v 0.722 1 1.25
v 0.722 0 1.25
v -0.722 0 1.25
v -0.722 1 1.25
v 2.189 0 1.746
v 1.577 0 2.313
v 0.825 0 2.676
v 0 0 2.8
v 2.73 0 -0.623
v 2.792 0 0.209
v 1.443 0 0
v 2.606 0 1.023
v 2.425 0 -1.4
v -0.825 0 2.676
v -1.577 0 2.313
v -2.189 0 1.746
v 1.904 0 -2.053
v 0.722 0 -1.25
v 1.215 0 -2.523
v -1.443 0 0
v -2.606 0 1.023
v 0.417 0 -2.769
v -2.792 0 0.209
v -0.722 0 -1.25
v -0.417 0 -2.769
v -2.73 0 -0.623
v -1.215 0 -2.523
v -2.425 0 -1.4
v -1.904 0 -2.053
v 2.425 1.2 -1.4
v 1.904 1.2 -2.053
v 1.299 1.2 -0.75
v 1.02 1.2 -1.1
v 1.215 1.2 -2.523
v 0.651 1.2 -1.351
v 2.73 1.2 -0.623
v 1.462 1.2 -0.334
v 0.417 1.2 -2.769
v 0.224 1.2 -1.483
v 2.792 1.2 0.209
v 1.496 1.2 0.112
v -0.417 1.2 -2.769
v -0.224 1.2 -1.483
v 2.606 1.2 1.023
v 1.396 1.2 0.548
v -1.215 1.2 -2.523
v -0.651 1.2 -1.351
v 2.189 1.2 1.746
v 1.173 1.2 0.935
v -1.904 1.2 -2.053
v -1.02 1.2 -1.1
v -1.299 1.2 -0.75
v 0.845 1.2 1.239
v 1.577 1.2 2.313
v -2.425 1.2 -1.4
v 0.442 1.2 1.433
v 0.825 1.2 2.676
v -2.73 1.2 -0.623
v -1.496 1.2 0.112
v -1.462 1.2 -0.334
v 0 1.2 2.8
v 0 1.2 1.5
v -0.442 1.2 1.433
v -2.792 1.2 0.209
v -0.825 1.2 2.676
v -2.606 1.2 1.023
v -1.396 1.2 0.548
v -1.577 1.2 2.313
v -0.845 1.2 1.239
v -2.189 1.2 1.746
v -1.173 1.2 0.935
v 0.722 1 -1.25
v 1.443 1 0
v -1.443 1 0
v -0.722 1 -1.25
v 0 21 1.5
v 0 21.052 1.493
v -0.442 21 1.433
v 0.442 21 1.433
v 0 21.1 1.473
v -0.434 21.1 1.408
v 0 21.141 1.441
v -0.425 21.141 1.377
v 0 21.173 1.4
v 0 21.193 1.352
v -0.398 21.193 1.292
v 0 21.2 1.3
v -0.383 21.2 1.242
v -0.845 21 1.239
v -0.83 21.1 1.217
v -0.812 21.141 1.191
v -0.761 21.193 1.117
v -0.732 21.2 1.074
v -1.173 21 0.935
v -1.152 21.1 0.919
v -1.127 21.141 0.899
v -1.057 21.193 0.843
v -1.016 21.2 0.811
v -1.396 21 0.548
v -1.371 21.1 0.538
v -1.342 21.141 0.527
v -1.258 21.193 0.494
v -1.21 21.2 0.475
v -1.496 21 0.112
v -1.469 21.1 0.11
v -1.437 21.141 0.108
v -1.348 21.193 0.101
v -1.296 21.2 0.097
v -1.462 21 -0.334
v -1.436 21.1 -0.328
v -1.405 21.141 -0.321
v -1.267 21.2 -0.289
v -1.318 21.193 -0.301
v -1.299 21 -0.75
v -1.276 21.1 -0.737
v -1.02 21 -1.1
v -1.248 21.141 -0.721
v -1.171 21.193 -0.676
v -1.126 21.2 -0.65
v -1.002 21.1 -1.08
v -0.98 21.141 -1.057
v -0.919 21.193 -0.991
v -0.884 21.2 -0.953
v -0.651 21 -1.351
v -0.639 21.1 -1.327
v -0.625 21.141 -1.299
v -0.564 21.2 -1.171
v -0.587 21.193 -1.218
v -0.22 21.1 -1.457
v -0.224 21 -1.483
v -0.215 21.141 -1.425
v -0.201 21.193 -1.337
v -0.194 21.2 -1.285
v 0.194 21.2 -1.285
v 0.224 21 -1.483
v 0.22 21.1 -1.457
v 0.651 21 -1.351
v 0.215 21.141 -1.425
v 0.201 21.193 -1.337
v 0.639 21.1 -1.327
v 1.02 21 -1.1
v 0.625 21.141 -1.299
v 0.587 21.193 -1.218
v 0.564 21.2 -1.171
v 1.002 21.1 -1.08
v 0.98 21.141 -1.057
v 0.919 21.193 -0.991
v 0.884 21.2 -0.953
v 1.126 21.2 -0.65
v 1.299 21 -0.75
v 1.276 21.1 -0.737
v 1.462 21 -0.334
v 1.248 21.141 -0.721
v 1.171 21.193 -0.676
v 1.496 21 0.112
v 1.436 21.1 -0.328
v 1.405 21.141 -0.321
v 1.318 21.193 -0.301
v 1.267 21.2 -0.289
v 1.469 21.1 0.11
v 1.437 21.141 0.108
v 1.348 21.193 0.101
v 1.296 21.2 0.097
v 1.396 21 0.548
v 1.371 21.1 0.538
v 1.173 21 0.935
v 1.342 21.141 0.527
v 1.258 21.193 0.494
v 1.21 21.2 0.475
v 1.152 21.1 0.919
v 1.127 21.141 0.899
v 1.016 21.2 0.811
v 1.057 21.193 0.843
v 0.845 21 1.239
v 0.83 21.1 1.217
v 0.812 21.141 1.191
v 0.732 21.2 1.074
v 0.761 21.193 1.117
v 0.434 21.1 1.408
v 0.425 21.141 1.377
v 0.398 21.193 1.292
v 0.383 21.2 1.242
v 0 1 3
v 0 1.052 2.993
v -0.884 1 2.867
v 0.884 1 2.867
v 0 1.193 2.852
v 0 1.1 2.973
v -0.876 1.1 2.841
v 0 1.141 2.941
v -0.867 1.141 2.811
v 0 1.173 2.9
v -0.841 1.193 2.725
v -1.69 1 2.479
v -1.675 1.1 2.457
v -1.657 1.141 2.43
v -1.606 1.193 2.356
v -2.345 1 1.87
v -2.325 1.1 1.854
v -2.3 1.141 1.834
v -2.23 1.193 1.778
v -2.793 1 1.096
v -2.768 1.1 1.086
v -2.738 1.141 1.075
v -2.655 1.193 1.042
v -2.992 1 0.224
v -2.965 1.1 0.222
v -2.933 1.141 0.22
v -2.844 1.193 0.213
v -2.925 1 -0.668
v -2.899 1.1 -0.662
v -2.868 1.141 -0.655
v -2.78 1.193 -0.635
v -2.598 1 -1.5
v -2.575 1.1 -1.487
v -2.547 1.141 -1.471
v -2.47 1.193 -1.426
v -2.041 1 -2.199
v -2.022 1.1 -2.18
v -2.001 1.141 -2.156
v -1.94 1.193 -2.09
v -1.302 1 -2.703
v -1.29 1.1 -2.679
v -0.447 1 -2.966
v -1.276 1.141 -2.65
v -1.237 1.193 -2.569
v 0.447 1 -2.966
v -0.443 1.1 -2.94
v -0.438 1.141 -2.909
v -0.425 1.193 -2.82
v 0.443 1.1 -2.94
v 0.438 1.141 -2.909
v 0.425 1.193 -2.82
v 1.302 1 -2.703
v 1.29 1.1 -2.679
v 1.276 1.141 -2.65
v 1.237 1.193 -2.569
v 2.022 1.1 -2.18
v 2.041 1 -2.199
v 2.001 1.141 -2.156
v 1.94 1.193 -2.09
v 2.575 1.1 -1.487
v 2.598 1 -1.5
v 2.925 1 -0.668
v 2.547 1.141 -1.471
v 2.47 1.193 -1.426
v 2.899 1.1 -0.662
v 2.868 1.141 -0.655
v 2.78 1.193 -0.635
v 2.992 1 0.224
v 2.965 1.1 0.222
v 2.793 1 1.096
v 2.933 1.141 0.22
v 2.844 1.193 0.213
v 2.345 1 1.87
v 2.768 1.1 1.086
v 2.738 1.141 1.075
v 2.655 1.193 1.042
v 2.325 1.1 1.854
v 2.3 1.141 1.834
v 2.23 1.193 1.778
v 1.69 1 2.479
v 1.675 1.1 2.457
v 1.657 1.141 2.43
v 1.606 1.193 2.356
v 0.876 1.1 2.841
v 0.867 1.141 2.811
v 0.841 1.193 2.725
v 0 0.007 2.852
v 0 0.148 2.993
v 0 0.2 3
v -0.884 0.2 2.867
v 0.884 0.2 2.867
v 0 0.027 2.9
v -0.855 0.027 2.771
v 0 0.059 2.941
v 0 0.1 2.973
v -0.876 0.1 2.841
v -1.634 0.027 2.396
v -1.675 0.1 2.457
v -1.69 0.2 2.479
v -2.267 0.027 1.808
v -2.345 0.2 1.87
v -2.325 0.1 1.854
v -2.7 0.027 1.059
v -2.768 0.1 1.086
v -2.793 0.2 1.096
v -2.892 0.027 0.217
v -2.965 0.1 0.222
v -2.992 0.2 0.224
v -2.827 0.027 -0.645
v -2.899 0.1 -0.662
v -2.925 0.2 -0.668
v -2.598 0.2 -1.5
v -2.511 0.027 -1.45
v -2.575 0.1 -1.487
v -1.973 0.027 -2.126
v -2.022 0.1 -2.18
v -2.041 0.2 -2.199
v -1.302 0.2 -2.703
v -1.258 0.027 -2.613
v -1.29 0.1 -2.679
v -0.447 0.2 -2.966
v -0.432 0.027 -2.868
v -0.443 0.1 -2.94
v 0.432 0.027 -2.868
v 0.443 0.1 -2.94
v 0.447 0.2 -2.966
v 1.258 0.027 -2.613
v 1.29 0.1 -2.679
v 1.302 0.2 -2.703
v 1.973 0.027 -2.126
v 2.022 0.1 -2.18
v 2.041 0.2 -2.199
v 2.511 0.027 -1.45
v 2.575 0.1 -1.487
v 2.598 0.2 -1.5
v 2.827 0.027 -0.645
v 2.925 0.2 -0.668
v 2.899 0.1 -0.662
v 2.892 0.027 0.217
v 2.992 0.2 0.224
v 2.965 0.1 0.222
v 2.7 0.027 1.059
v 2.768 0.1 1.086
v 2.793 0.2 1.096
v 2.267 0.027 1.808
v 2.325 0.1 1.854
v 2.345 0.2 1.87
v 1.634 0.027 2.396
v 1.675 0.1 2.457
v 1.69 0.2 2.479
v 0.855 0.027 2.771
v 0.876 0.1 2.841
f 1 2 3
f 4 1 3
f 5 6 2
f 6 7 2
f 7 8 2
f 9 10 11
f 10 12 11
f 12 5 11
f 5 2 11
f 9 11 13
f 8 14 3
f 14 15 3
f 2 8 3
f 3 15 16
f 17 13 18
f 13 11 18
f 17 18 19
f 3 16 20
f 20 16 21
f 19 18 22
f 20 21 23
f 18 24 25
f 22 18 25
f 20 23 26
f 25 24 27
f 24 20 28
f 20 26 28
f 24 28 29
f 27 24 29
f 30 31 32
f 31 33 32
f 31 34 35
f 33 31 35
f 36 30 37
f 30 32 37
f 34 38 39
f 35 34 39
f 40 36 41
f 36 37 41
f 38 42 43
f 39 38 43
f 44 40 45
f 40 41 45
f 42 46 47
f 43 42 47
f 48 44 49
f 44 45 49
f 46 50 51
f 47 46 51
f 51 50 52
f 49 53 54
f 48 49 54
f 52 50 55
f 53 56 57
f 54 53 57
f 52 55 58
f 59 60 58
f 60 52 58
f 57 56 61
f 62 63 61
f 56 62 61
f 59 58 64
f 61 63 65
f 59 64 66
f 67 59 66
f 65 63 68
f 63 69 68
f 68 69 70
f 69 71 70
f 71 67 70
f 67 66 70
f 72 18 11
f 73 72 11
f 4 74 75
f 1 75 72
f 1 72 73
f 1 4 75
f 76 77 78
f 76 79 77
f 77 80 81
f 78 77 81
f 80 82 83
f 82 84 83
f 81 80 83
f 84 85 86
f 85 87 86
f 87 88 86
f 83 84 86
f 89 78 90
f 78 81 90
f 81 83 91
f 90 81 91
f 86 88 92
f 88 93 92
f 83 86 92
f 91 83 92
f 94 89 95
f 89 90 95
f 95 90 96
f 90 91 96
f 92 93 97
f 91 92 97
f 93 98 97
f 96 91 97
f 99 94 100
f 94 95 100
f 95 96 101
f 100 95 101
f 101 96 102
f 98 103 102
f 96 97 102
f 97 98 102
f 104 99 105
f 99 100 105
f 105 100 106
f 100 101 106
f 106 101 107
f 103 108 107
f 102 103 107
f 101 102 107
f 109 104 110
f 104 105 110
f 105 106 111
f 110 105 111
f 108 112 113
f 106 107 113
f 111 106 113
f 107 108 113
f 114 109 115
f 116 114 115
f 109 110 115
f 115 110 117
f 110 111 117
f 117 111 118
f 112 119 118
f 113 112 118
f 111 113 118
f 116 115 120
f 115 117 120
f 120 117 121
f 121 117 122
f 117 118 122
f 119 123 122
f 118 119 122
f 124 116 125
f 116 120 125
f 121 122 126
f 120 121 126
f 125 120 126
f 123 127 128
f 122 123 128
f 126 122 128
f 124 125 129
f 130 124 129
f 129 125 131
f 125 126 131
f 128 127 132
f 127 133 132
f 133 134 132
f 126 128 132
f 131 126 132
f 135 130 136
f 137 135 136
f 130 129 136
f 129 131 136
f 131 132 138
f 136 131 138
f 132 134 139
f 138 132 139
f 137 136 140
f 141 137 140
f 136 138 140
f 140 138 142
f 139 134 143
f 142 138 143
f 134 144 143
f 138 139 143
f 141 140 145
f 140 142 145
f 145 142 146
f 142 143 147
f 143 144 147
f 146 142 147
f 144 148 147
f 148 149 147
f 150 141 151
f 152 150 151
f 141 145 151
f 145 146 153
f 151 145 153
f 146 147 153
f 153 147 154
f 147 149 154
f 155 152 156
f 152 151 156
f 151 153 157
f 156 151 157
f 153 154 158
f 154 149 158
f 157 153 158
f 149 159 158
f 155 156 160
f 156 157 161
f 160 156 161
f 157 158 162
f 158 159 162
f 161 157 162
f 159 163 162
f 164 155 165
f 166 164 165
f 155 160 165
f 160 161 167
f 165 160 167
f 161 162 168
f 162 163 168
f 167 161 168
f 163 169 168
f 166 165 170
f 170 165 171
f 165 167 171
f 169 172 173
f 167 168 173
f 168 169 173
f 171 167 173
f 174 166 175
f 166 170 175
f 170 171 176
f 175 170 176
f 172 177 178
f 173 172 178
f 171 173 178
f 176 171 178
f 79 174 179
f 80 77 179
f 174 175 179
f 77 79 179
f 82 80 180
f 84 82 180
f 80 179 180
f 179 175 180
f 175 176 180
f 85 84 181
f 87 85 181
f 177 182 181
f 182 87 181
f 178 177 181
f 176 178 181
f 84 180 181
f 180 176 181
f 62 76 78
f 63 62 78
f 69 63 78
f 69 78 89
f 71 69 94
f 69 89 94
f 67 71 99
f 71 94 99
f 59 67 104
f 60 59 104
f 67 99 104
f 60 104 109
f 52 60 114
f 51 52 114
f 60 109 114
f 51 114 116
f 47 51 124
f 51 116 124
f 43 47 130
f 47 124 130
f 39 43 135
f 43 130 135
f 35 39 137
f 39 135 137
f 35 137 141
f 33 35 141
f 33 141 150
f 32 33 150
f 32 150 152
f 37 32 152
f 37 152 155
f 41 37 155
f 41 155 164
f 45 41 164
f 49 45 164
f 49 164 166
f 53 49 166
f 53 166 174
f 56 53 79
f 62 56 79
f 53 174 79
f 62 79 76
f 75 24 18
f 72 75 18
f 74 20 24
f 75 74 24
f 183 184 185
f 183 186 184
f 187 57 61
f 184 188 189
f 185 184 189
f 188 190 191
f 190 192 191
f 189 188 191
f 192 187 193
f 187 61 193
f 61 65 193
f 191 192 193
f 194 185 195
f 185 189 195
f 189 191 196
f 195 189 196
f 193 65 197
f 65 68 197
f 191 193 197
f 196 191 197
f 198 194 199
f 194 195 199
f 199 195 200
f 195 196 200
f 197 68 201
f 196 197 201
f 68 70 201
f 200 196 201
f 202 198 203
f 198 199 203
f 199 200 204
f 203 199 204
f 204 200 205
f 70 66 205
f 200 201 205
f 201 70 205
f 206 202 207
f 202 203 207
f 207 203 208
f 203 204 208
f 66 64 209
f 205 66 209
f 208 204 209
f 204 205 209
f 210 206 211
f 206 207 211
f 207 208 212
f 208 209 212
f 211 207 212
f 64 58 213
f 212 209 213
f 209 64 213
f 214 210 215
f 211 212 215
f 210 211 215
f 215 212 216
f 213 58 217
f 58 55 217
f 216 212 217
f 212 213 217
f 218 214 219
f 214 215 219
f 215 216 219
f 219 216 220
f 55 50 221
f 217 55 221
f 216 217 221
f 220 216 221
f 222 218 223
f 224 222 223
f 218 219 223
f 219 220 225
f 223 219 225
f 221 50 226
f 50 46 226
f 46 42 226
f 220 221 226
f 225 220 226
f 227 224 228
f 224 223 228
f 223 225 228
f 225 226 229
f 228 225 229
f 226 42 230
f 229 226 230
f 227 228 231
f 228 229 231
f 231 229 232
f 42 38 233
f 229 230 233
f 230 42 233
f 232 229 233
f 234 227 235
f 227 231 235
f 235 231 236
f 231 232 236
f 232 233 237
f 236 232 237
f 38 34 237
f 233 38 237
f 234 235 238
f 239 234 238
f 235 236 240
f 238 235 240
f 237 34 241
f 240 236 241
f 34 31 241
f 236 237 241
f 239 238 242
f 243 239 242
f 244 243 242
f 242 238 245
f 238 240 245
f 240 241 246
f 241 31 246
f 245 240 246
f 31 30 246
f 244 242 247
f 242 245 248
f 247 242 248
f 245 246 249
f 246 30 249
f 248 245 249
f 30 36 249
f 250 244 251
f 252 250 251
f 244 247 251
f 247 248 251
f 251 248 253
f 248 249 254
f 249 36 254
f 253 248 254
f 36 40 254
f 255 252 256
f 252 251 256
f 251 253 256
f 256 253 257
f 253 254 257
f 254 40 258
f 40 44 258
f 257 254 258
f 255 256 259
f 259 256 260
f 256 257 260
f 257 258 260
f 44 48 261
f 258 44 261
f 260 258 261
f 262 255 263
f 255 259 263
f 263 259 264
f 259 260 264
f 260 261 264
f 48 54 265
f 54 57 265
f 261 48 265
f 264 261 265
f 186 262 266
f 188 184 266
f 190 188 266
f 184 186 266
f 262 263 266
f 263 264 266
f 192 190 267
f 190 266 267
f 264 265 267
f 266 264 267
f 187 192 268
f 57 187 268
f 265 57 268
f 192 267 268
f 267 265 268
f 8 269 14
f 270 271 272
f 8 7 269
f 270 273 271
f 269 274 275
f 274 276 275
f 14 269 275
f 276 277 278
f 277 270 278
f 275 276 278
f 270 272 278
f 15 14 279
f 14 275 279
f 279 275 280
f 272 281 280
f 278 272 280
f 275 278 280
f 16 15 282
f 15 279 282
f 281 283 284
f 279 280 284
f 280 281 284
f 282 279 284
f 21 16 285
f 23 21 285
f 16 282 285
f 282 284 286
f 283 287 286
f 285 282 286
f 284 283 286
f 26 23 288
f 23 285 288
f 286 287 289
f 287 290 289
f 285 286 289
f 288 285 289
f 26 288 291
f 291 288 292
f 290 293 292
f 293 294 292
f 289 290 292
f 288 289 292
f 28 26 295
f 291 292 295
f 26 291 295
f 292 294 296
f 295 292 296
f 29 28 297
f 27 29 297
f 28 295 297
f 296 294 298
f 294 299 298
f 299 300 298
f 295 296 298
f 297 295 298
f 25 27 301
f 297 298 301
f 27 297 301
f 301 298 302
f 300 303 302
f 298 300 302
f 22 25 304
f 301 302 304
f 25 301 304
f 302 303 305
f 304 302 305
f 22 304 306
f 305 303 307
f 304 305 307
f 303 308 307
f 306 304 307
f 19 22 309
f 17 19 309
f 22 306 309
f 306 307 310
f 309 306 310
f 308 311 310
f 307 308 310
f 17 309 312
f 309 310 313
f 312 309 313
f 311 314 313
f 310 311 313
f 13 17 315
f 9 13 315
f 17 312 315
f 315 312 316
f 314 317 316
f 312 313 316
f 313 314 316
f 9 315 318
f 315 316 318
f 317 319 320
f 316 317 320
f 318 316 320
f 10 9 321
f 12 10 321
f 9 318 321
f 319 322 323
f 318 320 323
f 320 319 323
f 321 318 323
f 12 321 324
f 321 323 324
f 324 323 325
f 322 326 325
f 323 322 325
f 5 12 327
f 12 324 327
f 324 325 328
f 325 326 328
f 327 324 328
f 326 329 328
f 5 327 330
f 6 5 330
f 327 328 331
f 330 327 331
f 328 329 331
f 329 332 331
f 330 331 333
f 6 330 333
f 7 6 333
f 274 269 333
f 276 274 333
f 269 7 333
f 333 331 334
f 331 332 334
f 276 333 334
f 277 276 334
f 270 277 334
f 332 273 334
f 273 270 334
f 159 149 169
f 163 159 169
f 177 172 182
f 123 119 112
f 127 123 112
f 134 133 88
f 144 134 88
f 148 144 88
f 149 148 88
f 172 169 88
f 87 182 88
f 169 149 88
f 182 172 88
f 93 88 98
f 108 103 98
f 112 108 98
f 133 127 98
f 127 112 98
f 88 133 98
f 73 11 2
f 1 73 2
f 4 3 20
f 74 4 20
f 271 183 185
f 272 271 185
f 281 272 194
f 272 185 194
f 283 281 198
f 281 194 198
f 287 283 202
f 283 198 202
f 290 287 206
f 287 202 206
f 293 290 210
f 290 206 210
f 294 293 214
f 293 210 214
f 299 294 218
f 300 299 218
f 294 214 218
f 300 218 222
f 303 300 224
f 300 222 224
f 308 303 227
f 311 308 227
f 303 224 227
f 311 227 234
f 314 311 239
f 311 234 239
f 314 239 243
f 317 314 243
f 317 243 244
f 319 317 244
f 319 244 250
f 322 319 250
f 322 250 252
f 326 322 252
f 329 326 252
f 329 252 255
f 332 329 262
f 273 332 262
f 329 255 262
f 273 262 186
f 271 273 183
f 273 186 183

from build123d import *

# Parameters (mm, degrees)
FILLET1_R          = 0.2
CUT_EXTRUDE1_DEPTH = 1


with BuildPart() as part:
    # Sketch2 → Revolve1 (revolve)
    with BuildSketch(Plane.XY, mode=Mode.PRIVATE) as revolve1_sk:
        Polygon((0, 0), (3, 0), (3, 1.2), (1.5, 1.2), (1.5, 21.2), (0, 21.2), align=None)
    revolve(revolve1_sk.sketch.rotate(Axis((0, 73.114266362, 0), (0, -1, 0)), 90), axis=Axis((0, 73.114266362, 0), (0, -1, 0)))

    # Fillet1
    fillet1_edges = [part.edges().sort_by_distance(p)[0] for p in [
        (0, 21.2, -1.5),
        (0, 1.2, -3),
        (0, 0, -3),
    ]]
    fillet(fillet1_edges, radius=FILLET1_R)

    # Sketch3 → Cut-Extrude1 (cut)
    with BuildSketch(Plane.XZ):
        Polygon((1.443375673, 0), (0.721687836, 1.25), (-0.721687836, 1.25), (-1.443375673, 0), (-0.721687836, -1.25), (0.721687836, -1.25), align=None)
    extrude(amount=-CUT_EXTRUDE1_DEPTH, mode=Mode.SUBTRACT)


solid = part.part
